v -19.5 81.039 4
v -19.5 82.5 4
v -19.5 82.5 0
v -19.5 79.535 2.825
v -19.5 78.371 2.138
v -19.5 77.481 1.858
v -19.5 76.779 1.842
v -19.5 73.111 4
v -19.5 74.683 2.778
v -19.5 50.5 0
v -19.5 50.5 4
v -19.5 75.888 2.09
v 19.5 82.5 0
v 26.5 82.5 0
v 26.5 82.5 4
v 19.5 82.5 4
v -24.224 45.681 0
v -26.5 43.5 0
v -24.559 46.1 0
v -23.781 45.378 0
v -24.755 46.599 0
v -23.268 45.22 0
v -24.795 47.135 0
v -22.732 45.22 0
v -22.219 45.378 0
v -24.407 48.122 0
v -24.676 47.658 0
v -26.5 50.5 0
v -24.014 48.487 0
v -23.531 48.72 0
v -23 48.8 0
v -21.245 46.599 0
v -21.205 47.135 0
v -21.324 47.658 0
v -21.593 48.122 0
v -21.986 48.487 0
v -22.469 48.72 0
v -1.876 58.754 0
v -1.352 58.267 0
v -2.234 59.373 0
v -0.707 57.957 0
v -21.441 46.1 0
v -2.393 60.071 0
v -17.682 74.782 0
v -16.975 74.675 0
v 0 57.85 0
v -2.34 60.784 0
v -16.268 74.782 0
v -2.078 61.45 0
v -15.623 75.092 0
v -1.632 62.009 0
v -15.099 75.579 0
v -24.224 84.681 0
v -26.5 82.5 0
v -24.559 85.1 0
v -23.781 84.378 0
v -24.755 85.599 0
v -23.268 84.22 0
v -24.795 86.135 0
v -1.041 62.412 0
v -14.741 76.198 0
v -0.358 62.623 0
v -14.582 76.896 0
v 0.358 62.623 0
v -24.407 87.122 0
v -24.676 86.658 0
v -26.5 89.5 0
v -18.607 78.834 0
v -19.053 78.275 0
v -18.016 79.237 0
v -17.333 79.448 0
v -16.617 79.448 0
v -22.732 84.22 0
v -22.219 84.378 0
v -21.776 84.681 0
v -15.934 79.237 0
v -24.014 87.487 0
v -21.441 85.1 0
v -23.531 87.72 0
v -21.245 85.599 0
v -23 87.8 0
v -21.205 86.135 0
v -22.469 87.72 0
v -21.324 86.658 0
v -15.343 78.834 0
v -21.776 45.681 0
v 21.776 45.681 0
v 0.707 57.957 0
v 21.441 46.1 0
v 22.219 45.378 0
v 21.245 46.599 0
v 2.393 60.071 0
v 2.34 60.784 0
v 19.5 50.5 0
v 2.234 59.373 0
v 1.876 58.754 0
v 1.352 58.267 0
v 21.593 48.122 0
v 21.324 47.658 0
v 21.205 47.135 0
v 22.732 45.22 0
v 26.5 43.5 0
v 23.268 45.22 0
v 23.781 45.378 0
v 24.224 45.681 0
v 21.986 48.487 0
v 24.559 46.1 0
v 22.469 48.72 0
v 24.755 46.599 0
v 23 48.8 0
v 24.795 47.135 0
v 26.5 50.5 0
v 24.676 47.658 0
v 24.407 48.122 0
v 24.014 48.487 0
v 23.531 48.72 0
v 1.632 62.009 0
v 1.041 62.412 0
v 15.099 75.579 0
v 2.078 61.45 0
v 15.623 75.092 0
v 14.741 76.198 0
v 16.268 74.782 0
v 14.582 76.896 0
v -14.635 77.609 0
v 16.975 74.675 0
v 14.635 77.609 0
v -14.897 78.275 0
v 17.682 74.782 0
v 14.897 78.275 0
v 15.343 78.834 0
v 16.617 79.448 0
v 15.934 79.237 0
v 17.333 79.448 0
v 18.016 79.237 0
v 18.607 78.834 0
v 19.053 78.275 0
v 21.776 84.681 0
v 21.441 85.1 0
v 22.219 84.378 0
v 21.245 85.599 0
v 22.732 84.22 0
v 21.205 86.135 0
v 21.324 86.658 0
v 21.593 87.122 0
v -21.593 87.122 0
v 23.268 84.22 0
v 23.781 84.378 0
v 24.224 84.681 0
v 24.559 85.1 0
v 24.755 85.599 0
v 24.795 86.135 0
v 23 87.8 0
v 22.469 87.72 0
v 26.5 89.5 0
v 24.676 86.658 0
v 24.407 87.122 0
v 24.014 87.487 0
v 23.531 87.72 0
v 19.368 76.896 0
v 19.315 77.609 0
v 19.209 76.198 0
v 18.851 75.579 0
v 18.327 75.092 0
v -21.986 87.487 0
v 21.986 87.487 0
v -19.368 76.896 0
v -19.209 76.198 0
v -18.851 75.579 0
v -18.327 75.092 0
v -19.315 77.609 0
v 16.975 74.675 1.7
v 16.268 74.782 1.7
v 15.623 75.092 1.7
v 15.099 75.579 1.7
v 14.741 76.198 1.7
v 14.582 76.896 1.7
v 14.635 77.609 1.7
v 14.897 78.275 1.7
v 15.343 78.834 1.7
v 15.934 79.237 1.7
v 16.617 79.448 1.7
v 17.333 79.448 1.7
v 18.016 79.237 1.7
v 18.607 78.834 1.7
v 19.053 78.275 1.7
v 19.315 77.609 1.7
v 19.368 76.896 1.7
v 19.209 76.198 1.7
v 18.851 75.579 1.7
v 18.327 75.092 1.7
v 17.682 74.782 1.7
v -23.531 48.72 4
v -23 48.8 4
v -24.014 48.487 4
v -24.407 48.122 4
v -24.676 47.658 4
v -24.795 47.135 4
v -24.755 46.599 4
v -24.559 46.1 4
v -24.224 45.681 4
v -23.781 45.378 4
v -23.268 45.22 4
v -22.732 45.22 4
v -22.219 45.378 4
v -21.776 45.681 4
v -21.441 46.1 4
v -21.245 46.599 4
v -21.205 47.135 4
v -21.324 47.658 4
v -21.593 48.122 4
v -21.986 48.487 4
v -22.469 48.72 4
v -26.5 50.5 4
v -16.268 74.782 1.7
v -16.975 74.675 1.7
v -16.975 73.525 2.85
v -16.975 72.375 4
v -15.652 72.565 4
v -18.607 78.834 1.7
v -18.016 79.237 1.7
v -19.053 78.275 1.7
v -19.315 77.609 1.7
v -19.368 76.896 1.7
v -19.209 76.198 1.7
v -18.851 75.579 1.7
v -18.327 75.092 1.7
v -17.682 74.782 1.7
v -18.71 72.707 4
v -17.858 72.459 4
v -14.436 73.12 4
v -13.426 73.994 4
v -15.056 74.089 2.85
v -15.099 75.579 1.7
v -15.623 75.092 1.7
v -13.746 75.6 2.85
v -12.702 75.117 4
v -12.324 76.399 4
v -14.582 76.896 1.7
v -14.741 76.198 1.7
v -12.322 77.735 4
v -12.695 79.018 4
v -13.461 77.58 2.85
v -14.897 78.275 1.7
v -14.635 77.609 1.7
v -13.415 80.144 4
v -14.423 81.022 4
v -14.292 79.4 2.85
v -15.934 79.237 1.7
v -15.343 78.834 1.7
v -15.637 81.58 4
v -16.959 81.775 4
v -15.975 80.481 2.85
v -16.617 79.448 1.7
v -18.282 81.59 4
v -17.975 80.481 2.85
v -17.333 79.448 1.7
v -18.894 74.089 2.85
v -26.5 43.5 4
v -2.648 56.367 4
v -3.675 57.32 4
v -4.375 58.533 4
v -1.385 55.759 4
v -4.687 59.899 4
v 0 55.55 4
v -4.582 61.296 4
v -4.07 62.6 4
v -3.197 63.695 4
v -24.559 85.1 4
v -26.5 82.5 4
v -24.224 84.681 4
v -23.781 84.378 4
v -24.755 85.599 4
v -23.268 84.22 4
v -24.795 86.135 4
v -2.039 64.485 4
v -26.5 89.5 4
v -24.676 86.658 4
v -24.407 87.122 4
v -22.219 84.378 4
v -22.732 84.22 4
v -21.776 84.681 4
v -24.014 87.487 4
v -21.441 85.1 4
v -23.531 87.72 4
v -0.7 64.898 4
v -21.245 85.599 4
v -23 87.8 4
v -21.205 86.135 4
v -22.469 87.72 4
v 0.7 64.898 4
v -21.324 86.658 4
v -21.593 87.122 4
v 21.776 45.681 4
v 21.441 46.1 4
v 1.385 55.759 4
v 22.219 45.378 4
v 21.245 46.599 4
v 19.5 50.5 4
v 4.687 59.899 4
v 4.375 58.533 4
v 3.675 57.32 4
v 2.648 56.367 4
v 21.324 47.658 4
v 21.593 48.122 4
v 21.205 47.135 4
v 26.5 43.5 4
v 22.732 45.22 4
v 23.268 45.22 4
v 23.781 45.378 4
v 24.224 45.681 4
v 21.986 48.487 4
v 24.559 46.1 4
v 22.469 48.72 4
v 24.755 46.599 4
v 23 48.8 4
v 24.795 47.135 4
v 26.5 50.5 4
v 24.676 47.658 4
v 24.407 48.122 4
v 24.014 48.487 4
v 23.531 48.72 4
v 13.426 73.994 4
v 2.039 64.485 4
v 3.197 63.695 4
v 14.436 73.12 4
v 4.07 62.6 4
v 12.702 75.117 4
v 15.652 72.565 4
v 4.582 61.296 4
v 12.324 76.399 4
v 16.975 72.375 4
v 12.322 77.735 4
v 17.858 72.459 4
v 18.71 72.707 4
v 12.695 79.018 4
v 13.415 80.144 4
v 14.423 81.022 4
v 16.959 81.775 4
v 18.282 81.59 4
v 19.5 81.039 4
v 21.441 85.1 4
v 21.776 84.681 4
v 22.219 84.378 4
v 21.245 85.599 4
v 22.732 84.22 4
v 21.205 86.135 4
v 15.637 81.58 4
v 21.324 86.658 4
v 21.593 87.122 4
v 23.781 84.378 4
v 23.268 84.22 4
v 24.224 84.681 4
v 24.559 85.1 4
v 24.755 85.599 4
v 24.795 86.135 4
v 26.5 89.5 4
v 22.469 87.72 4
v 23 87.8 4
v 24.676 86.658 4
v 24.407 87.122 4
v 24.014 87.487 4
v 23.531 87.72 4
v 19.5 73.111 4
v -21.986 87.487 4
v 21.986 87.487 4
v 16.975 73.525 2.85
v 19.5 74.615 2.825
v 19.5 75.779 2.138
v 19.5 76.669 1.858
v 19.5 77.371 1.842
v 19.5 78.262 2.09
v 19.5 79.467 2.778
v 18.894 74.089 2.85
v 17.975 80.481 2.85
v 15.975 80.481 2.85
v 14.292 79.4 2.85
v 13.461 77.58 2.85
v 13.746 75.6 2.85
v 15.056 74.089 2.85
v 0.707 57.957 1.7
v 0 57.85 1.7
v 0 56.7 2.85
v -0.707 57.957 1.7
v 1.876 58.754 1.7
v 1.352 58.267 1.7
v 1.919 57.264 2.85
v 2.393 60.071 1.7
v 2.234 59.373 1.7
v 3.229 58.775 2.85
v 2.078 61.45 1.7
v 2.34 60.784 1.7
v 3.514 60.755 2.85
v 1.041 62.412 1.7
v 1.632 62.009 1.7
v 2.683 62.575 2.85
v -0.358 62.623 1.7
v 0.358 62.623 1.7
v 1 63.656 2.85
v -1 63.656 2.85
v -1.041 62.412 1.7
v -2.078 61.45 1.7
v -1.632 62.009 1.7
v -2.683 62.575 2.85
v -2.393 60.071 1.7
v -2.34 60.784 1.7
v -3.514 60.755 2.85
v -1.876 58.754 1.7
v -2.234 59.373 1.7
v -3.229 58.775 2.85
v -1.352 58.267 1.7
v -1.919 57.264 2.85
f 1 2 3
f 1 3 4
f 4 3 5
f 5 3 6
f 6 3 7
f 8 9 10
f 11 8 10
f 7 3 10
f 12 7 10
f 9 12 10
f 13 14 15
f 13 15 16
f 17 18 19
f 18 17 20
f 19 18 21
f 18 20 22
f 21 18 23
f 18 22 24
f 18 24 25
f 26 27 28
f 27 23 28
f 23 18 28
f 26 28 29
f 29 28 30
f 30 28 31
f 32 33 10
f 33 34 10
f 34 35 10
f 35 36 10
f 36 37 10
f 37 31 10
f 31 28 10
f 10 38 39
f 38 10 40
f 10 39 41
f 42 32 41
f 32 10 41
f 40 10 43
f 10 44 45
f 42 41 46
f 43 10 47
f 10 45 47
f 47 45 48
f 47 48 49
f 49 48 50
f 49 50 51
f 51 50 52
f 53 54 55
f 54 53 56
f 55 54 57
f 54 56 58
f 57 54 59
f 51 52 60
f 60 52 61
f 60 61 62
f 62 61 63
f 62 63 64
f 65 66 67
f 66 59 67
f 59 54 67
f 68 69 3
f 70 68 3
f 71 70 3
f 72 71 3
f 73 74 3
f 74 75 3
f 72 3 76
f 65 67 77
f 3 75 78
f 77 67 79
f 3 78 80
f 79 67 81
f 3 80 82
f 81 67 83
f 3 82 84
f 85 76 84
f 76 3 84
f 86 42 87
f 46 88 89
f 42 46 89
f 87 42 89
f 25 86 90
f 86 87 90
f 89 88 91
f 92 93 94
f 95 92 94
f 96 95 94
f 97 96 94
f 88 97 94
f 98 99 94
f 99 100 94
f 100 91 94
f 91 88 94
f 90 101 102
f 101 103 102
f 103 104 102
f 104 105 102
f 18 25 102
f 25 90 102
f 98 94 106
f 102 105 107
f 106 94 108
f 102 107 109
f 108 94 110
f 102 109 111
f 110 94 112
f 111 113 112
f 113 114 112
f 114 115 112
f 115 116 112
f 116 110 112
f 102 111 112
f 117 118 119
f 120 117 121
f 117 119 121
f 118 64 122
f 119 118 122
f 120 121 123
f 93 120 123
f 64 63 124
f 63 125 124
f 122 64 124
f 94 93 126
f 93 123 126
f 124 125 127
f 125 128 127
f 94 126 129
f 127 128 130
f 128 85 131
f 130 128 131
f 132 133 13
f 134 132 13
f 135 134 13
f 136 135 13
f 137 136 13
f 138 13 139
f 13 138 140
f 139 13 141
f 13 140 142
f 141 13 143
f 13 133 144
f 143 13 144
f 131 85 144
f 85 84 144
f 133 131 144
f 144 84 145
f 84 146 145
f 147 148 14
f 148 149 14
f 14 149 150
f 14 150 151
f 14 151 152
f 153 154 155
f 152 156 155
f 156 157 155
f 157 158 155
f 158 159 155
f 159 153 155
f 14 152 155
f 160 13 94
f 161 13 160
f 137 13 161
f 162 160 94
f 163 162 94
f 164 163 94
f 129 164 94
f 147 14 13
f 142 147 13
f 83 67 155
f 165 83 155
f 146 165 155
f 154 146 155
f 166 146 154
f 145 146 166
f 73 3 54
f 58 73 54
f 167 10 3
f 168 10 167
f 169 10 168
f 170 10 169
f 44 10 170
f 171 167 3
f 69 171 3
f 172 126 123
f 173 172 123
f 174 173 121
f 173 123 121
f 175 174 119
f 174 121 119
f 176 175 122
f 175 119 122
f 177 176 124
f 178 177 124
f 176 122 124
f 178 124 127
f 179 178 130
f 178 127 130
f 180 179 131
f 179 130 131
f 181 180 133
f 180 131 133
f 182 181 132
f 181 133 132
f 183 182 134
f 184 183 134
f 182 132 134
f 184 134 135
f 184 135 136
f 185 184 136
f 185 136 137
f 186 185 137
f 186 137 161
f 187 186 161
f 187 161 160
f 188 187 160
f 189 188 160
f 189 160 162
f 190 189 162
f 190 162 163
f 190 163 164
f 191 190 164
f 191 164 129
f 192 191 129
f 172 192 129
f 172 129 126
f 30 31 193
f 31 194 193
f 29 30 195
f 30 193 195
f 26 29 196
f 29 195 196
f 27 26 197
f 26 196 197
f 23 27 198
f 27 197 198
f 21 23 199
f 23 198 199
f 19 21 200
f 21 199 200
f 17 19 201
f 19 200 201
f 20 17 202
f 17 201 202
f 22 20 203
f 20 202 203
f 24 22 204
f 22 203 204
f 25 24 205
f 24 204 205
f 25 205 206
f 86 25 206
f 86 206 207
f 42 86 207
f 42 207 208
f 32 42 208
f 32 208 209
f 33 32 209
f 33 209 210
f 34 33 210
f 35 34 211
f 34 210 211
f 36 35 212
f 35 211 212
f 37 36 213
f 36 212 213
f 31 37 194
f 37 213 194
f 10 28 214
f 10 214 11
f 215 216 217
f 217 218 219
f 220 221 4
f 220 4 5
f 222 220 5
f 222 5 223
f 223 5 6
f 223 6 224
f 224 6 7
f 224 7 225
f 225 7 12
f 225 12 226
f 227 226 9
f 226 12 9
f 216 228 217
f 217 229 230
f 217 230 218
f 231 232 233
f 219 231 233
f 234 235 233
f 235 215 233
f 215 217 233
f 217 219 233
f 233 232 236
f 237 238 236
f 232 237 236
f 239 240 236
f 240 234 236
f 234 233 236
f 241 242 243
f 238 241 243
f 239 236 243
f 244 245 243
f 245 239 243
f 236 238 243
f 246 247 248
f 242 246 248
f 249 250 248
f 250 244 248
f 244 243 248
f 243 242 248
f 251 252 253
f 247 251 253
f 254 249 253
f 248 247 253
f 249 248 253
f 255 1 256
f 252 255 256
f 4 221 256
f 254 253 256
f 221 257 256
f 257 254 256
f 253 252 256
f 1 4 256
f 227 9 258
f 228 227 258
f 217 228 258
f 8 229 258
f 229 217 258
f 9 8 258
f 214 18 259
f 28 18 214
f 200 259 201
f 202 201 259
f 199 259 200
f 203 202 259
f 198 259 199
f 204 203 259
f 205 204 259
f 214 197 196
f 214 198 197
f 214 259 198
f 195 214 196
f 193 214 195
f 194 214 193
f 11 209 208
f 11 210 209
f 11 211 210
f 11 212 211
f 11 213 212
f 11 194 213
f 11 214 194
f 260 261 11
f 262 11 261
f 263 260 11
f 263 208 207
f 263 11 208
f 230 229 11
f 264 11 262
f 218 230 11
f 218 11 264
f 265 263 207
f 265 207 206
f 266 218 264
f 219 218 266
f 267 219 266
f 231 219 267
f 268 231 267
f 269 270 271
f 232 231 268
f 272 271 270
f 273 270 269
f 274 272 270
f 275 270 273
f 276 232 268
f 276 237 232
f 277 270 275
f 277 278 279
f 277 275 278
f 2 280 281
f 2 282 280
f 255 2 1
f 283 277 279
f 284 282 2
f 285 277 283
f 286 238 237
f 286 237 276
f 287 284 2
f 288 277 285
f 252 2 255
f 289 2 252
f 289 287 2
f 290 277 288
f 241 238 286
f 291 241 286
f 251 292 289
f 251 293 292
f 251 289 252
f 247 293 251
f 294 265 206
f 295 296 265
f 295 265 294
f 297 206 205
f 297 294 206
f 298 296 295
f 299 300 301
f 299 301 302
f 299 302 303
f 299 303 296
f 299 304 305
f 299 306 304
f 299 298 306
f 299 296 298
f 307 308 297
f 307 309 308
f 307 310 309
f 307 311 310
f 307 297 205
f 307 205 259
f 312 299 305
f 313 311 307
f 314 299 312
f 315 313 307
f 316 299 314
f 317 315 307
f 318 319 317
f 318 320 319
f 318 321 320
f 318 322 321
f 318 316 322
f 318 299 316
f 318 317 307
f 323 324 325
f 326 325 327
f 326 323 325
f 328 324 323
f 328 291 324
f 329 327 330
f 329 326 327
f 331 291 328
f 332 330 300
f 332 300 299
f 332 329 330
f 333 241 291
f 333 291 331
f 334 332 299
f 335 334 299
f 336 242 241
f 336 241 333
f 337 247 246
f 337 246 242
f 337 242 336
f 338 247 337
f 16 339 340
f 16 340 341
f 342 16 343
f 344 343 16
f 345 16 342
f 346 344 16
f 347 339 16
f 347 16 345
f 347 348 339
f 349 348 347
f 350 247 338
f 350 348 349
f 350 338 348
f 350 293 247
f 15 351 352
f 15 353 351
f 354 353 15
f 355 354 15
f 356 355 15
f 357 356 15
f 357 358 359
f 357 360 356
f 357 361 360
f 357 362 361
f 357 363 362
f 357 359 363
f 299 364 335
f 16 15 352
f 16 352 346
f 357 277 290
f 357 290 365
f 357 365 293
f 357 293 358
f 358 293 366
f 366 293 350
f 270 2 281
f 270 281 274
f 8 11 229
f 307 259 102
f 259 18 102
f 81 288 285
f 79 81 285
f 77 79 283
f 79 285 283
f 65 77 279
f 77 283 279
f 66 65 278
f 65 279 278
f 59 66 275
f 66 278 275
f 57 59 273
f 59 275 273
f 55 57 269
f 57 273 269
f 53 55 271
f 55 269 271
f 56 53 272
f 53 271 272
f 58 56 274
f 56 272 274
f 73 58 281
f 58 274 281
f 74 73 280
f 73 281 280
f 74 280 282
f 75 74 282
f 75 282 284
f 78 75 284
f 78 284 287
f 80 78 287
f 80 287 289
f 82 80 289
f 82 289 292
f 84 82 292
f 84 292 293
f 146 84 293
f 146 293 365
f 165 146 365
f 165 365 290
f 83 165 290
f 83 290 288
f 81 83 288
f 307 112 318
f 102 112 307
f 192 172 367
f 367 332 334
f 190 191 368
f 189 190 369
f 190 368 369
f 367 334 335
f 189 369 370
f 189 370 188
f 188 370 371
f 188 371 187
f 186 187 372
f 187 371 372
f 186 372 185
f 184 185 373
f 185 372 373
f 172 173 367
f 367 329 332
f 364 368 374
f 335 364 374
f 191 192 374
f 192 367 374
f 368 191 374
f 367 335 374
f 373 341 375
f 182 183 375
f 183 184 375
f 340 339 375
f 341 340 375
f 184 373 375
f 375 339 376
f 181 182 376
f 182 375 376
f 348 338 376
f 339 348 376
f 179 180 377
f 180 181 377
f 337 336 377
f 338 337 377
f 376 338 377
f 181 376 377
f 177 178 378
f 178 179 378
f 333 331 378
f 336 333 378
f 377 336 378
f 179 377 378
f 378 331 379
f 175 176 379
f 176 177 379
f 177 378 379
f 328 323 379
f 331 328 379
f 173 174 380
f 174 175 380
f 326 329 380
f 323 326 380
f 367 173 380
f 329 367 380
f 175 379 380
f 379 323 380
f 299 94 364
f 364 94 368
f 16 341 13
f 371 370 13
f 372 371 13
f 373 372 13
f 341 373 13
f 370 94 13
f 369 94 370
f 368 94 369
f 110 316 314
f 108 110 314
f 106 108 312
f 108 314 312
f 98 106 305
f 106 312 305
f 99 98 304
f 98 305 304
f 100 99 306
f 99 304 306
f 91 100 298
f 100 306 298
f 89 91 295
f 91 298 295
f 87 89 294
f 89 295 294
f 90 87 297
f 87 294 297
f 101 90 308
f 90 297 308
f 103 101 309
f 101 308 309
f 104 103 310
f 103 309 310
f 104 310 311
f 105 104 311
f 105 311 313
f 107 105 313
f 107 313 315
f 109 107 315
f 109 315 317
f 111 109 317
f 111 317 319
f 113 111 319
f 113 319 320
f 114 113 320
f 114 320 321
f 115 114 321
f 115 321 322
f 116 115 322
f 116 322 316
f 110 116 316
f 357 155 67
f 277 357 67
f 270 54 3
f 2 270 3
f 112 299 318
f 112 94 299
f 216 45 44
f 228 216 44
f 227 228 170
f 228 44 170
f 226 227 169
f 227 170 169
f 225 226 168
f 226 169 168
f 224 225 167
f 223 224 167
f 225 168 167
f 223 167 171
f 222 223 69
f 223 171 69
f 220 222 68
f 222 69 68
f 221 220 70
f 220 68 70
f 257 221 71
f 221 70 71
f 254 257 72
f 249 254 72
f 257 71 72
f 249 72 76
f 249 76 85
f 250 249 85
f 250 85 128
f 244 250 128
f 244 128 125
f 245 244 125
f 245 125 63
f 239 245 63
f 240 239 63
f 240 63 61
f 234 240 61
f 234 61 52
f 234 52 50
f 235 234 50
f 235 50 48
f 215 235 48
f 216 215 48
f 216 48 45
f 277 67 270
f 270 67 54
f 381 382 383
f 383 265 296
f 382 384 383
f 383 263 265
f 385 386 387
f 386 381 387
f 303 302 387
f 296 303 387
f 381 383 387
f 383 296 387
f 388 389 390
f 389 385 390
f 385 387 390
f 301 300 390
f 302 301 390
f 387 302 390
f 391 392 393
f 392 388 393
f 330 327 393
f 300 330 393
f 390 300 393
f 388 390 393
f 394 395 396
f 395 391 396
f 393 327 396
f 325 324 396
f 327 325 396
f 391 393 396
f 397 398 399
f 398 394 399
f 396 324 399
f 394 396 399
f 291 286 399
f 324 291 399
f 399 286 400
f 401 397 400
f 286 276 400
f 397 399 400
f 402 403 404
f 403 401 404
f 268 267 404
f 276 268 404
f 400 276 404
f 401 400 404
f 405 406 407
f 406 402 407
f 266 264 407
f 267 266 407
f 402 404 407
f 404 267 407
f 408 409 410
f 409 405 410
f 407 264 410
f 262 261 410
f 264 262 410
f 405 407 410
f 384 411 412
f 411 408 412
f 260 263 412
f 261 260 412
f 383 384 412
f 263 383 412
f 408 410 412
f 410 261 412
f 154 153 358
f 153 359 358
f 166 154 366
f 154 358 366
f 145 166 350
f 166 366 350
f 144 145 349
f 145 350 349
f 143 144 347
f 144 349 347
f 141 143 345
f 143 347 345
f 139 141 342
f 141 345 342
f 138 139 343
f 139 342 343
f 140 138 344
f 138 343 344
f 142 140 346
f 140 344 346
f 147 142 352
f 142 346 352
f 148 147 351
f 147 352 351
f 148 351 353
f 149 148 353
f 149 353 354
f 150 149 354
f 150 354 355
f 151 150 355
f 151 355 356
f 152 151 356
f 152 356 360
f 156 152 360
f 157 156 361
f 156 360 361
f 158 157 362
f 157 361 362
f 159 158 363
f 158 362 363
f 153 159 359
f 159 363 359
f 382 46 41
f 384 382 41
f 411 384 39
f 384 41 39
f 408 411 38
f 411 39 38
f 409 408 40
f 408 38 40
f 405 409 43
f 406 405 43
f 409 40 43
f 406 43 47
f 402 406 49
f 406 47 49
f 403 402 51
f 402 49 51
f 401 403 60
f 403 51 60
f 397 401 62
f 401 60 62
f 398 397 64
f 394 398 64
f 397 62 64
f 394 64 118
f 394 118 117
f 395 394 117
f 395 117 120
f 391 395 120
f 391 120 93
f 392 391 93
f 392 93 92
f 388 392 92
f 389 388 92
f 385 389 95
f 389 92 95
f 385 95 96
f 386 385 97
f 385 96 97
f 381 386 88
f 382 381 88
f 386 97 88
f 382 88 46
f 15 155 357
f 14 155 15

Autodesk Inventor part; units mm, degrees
ref_plane "YZ Plane" through (0, 0, 0) normal (1, 0, 0) x (0, 1, 0)
ref_plane "XZ Plane" through (0, 0, 0) normal (0, 1, 0) x (-1, 0, 0)
ref_plane "XY Plane" through (0, 0, 0) normal (0, 0, 1) x (1, 0, 0)
sketch "Sketch1" plane through (0, 0, 0) normal (0, 0, 1) x (1, 0, 0)
  circle A0 centre (16.975, 77.075) radius 1.621 projected
  circle A1 centre (0, 60.25) radius 1.621 projected
  circle A2 centre (-16.975, 77.075) radius 1.621 projected
  line L0 (-19.5, 89.5) -> (-19.5, 43.5) projected
  line L1 (-19.5, 43.5) -> (-13.8, 43.5) projected
  line L2 (-13.8, 43.5) -> (-13.8, 49.1) projected
  arc A3 (-10.8, 52.1) -> (-13.8, 49.1) centre (-10.8, 49.1) ccw projected
  line L3 (-10.8, 52.1) -> (10.8, 52.1) projected
  arc A4 (13.8, 49.1) -> (10.8, 52.1) centre (10.8, 49.1) ccw projected
  line L4 (13.8, 49.1) -> (13.8, 43.5) projected
  line L5 (13.8, 43.5) -> (19.5, 43.5) projected
  line L6 (19.5, 43.5) -> (19.5, 89.5) projected
  line L7 (19.5, 89.5) -> (-19.5, 89.5) projected
  circle A5 centre (-17, 46.5) radius 1.25 projected
  circle A6 centre (17, 46.5) radius 1.25 projected
  circle A7 centre (17, 86.5) radius 1.25 projected
  circle A8 centre (-17, 86.5) radius 1.25 projected
  line L8 (-19.5, 89.5) -> (19.5, 89.5)
  line L9 (19.5, 89.5) -> (19.5, 43.5)
  line L10 (19.5, 43.5) -> (-19.5, 43.5)
  line L11 (-19.5, 43.5) -> (-19.5, 89.5)
  point P0 (0, 0)
  point P1 (-13.8, 43.5)
  point P2 (13.8, 43.5)
extrude "Extrusion1" add sketch "Sketch1" along normal blind 4 contours A0 | A1 | A2 | L7 L6 L5 L4 A4 L3 A3 L2 L1 L0 | L2 A3 L3 A4 L4 L10 | A5 | A6 | A7 | A8
sketch "Sketch2" plane through (0, 0, 4) normal (0, 0, 1) x (1, 0, 0)
  circle A0 centre (16.975, 77.075) radius 1.621 projected
  circle A1 centre (0, 60.25) radius 1.621 projected
  circle A2 centre (-16.975, 77.075) radius 1.621 projected
  line L0 (-19.5, 89.5) -> (-19.5, 43.5) projected
  line L1 (-19.5, 43.5) -> (-13.8, 43.5) projected
  line L2 (-13.8, 43.5) -> (-13.8, 49.1) projected
  arc A3 (-10.8, 52.1) -> (-13.8, 49.1) centre (-10.8, 49.1) ccw projected
  line L3 (-10.8, 52.1) -> (10.8, 52.1) projected
  arc A4 (13.8, 49.1) -> (10.8, 52.1) centre (10.8, 49.1) ccw projected
  line L4 (13.8, 49.1) -> (13.8, 43.5) projected
  line L5 (13.8, 43.5) -> (19.5, 43.5) projected
  line L6 (19.5, 43.5) -> (19.5, 89.5) projected
  line L7 (19.5, 89.5) -> (-19.5, 89.5) projected
  circle A5 centre (-17, 46.5) radius 1.25 projected
  circle A6 centre (17, 46.5) radius 1.25 projected
  circle A7 centre (17, 86.5) radius 1.25 projected
  circle A8 centre (-17, 86.5) radius 1.25 projected
  point P0 (0, 0)
hole "Hole1" at (-16.975, 77.075, 4) at (16.975, 77.075, 4) at (0, 60.25, 4) direction (0, 0, -1) diameter 4.8 depth 5 countersink diameter 9.4 countersink angle 90 clearance for "Countersunk Flat Head Screw ISO 2009/7046" size "M4" standard "ISO"
sketch "Sketch3" plane through (0, 0, 0) normal (0, 0, -1) x (-1, 0, 0)
  line L0 (-19.5, 81.0391) -> (-19.5, 89.5) projected
  line L1 (-19.5, 89.5) -> (19.5, 89.5) projected
  line L2 (19.5, 89.5) -> (19.5, 81.0391) projected
  line L3 (19.5, 43.5) -> (-19.5, 43.5) projected
  line L4 (-19.5, 89.5) -> (19.5, 89.5) projected
  line L5 (19.5, 89.5) -> (26.5, 89.5)
  line L6 (26.5, 89.5) -> (26.5, 82.5)
  line L7 (26.5, 82.5) -> (19.5, 82.5)
  line L8 (19.5, 82.5) -> (19.5, 89.5)
  line L9 (-19.5, 89.5) -> (-26.5, 89.5)
  line L10 (-26.5, 89.5) -> (-26.5, 82.5)
  line L11 (-26.5, 82.5) -> (-19.5, 82.5)
  line L12 (-19.5, 82.5) -> (-19.5, 89.5)
  line L13 (19.5, 43.5) -> (-19.5, 43.5) projected
  line L14 (19.5, 43.5) -> (26.5, 43.5)
  line L15 (26.5, 43.5) -> (26.5, 50.5)
  line L16 (26.5, 50.5) -> (19.5, 50.5)
  line L17 (19.5, 50.5) -> (19.5, 43.5)
  line L18 (-19.5, 50.5) -> (-26.5, 50.5)
  line L19 (-26.5, 50.5) -> (-26.5, 43.5)
  line L20 (-26.5, 43.5) -> (-19.5, 43.5)
  line L21 (-19.5, 43.5) -> (-19.5, 50.5)
  arc A0 (-19.5, 73.1109) -> (-19.5, 81.0391) centre (-16.975, 77.075) ccw projected
  arc A1 (19.5, 81.0391) -> (19.5, 73.1109) centre (16.975, 77.075) ccw projected
  line L22 (19.5, 73.1109) -> (19.5, 43.5) projected
  line L23 (-19.5, 43.5) -> (-19.5, 73.1109) projected
  point P0 (0, 0)
  point P1 (-19.5, 82.5)
  point P2 (19.5, 82.5)
  dimension "d9" = 7
  dimension "d10" = 7
  dimension "d11" = 7
  dimension "d12" = 7
  dimension "d15" = 7
  dimension "d16" = 7
  dimension "d17" = 7
  dimension "d18" = 7
  dimension "d19" = 0
extrude "Extrusion2" add sketch "Sketch3" against normal up to surface (4 mm away) contours L11 L10 L9 L0 | L21 L20 L19 L18 | L5 L6 L7 L2 | L17 L16 L15 L14
sketch "Sketch4" plane through (0, 0, 0) normal (0, 0, -1) x (-1, 0, 0)
  line L0 (26.5, 43.5) -> (-26.5, 43.5) projected
  line L1 (26.5, 43.5) -> (26.5, 50.5) projected
  line L2 (26.5, 50.5) -> (19.5, 50.5) projected
  line L3 (19.5, 82.5) -> (19.5, 50.5) projected
  line L4 (19.5, 82.5) -> (26.5, 82.5) projected
  line L5 (26.5, 82.5) -> (26.5, 89.5) projected
  line L6 (26.5, 89.5) -> (-26.5, 89.5) projected
  line L7 (-26.5, 89.5) -> (-26.5, 82.5) projected
  line L8 (-26.5, 82.5) -> (-19.5, 82.5) projected
  line L9 (-19.5, 50.5) -> (-19.5, 82.5) projected
  line L10 (-19.5, 50.5) -> (-26.5, 50.5) projected
  line L11 (-26.5, 50.5) -> (-26.5, 43.5) projected
  line L12 (26.5, 50.5) -> (19.5, 43.5)
  line L13 (19.5, 82.5) -> (19.5, 50.5) projected
  line L14 (26.5, 43.5) -> (19.5, 50.5)
  line L15 (-26.5, 50.5) -> (-26.5, 43.5) projected
  line L16 (-26.5, 50.5) -> (-19.5, 43.5)
  line L17 (-26.5, 43.5) -> (-19.5, 50.5)
  line L18 (26.5, 89.5) -> (19.5, 82.5)
  line L19 (26.5, 82.5) -> (19.5, 89.5)
  line L20 (-19.5, 50.5) -> (-19.5, 82.5) projected
  line L21 (-26.5, 89.5) -> (-19.5, 82.5)
  line L22 (-19.5, 82.5) -> (-26.5, 82.5)
  line L23 (-26.5, 82.5) -> (-19.5, 89.5)
  point P0 (0, 0)
  point P1 (19.5, 73.1109)
  point P2 (-19.5, 81.0391)
  point P3 (23, 47)
  point P4 (-23, 47)
  point P5 (-23, 86)
  point P6 (23, 86)
hole "Hole2" at (-23, 47, 0) at (23, 47, 0) at (23, 86, 0) at (-23, 86, 0) direction (0, 0, 1) diameter 3.6 depth 5 clearance for "Countersunk Flat Head Screw ISO 2009/7046" size "M3" standard "ISO"
properties part number "vesc_holder"
